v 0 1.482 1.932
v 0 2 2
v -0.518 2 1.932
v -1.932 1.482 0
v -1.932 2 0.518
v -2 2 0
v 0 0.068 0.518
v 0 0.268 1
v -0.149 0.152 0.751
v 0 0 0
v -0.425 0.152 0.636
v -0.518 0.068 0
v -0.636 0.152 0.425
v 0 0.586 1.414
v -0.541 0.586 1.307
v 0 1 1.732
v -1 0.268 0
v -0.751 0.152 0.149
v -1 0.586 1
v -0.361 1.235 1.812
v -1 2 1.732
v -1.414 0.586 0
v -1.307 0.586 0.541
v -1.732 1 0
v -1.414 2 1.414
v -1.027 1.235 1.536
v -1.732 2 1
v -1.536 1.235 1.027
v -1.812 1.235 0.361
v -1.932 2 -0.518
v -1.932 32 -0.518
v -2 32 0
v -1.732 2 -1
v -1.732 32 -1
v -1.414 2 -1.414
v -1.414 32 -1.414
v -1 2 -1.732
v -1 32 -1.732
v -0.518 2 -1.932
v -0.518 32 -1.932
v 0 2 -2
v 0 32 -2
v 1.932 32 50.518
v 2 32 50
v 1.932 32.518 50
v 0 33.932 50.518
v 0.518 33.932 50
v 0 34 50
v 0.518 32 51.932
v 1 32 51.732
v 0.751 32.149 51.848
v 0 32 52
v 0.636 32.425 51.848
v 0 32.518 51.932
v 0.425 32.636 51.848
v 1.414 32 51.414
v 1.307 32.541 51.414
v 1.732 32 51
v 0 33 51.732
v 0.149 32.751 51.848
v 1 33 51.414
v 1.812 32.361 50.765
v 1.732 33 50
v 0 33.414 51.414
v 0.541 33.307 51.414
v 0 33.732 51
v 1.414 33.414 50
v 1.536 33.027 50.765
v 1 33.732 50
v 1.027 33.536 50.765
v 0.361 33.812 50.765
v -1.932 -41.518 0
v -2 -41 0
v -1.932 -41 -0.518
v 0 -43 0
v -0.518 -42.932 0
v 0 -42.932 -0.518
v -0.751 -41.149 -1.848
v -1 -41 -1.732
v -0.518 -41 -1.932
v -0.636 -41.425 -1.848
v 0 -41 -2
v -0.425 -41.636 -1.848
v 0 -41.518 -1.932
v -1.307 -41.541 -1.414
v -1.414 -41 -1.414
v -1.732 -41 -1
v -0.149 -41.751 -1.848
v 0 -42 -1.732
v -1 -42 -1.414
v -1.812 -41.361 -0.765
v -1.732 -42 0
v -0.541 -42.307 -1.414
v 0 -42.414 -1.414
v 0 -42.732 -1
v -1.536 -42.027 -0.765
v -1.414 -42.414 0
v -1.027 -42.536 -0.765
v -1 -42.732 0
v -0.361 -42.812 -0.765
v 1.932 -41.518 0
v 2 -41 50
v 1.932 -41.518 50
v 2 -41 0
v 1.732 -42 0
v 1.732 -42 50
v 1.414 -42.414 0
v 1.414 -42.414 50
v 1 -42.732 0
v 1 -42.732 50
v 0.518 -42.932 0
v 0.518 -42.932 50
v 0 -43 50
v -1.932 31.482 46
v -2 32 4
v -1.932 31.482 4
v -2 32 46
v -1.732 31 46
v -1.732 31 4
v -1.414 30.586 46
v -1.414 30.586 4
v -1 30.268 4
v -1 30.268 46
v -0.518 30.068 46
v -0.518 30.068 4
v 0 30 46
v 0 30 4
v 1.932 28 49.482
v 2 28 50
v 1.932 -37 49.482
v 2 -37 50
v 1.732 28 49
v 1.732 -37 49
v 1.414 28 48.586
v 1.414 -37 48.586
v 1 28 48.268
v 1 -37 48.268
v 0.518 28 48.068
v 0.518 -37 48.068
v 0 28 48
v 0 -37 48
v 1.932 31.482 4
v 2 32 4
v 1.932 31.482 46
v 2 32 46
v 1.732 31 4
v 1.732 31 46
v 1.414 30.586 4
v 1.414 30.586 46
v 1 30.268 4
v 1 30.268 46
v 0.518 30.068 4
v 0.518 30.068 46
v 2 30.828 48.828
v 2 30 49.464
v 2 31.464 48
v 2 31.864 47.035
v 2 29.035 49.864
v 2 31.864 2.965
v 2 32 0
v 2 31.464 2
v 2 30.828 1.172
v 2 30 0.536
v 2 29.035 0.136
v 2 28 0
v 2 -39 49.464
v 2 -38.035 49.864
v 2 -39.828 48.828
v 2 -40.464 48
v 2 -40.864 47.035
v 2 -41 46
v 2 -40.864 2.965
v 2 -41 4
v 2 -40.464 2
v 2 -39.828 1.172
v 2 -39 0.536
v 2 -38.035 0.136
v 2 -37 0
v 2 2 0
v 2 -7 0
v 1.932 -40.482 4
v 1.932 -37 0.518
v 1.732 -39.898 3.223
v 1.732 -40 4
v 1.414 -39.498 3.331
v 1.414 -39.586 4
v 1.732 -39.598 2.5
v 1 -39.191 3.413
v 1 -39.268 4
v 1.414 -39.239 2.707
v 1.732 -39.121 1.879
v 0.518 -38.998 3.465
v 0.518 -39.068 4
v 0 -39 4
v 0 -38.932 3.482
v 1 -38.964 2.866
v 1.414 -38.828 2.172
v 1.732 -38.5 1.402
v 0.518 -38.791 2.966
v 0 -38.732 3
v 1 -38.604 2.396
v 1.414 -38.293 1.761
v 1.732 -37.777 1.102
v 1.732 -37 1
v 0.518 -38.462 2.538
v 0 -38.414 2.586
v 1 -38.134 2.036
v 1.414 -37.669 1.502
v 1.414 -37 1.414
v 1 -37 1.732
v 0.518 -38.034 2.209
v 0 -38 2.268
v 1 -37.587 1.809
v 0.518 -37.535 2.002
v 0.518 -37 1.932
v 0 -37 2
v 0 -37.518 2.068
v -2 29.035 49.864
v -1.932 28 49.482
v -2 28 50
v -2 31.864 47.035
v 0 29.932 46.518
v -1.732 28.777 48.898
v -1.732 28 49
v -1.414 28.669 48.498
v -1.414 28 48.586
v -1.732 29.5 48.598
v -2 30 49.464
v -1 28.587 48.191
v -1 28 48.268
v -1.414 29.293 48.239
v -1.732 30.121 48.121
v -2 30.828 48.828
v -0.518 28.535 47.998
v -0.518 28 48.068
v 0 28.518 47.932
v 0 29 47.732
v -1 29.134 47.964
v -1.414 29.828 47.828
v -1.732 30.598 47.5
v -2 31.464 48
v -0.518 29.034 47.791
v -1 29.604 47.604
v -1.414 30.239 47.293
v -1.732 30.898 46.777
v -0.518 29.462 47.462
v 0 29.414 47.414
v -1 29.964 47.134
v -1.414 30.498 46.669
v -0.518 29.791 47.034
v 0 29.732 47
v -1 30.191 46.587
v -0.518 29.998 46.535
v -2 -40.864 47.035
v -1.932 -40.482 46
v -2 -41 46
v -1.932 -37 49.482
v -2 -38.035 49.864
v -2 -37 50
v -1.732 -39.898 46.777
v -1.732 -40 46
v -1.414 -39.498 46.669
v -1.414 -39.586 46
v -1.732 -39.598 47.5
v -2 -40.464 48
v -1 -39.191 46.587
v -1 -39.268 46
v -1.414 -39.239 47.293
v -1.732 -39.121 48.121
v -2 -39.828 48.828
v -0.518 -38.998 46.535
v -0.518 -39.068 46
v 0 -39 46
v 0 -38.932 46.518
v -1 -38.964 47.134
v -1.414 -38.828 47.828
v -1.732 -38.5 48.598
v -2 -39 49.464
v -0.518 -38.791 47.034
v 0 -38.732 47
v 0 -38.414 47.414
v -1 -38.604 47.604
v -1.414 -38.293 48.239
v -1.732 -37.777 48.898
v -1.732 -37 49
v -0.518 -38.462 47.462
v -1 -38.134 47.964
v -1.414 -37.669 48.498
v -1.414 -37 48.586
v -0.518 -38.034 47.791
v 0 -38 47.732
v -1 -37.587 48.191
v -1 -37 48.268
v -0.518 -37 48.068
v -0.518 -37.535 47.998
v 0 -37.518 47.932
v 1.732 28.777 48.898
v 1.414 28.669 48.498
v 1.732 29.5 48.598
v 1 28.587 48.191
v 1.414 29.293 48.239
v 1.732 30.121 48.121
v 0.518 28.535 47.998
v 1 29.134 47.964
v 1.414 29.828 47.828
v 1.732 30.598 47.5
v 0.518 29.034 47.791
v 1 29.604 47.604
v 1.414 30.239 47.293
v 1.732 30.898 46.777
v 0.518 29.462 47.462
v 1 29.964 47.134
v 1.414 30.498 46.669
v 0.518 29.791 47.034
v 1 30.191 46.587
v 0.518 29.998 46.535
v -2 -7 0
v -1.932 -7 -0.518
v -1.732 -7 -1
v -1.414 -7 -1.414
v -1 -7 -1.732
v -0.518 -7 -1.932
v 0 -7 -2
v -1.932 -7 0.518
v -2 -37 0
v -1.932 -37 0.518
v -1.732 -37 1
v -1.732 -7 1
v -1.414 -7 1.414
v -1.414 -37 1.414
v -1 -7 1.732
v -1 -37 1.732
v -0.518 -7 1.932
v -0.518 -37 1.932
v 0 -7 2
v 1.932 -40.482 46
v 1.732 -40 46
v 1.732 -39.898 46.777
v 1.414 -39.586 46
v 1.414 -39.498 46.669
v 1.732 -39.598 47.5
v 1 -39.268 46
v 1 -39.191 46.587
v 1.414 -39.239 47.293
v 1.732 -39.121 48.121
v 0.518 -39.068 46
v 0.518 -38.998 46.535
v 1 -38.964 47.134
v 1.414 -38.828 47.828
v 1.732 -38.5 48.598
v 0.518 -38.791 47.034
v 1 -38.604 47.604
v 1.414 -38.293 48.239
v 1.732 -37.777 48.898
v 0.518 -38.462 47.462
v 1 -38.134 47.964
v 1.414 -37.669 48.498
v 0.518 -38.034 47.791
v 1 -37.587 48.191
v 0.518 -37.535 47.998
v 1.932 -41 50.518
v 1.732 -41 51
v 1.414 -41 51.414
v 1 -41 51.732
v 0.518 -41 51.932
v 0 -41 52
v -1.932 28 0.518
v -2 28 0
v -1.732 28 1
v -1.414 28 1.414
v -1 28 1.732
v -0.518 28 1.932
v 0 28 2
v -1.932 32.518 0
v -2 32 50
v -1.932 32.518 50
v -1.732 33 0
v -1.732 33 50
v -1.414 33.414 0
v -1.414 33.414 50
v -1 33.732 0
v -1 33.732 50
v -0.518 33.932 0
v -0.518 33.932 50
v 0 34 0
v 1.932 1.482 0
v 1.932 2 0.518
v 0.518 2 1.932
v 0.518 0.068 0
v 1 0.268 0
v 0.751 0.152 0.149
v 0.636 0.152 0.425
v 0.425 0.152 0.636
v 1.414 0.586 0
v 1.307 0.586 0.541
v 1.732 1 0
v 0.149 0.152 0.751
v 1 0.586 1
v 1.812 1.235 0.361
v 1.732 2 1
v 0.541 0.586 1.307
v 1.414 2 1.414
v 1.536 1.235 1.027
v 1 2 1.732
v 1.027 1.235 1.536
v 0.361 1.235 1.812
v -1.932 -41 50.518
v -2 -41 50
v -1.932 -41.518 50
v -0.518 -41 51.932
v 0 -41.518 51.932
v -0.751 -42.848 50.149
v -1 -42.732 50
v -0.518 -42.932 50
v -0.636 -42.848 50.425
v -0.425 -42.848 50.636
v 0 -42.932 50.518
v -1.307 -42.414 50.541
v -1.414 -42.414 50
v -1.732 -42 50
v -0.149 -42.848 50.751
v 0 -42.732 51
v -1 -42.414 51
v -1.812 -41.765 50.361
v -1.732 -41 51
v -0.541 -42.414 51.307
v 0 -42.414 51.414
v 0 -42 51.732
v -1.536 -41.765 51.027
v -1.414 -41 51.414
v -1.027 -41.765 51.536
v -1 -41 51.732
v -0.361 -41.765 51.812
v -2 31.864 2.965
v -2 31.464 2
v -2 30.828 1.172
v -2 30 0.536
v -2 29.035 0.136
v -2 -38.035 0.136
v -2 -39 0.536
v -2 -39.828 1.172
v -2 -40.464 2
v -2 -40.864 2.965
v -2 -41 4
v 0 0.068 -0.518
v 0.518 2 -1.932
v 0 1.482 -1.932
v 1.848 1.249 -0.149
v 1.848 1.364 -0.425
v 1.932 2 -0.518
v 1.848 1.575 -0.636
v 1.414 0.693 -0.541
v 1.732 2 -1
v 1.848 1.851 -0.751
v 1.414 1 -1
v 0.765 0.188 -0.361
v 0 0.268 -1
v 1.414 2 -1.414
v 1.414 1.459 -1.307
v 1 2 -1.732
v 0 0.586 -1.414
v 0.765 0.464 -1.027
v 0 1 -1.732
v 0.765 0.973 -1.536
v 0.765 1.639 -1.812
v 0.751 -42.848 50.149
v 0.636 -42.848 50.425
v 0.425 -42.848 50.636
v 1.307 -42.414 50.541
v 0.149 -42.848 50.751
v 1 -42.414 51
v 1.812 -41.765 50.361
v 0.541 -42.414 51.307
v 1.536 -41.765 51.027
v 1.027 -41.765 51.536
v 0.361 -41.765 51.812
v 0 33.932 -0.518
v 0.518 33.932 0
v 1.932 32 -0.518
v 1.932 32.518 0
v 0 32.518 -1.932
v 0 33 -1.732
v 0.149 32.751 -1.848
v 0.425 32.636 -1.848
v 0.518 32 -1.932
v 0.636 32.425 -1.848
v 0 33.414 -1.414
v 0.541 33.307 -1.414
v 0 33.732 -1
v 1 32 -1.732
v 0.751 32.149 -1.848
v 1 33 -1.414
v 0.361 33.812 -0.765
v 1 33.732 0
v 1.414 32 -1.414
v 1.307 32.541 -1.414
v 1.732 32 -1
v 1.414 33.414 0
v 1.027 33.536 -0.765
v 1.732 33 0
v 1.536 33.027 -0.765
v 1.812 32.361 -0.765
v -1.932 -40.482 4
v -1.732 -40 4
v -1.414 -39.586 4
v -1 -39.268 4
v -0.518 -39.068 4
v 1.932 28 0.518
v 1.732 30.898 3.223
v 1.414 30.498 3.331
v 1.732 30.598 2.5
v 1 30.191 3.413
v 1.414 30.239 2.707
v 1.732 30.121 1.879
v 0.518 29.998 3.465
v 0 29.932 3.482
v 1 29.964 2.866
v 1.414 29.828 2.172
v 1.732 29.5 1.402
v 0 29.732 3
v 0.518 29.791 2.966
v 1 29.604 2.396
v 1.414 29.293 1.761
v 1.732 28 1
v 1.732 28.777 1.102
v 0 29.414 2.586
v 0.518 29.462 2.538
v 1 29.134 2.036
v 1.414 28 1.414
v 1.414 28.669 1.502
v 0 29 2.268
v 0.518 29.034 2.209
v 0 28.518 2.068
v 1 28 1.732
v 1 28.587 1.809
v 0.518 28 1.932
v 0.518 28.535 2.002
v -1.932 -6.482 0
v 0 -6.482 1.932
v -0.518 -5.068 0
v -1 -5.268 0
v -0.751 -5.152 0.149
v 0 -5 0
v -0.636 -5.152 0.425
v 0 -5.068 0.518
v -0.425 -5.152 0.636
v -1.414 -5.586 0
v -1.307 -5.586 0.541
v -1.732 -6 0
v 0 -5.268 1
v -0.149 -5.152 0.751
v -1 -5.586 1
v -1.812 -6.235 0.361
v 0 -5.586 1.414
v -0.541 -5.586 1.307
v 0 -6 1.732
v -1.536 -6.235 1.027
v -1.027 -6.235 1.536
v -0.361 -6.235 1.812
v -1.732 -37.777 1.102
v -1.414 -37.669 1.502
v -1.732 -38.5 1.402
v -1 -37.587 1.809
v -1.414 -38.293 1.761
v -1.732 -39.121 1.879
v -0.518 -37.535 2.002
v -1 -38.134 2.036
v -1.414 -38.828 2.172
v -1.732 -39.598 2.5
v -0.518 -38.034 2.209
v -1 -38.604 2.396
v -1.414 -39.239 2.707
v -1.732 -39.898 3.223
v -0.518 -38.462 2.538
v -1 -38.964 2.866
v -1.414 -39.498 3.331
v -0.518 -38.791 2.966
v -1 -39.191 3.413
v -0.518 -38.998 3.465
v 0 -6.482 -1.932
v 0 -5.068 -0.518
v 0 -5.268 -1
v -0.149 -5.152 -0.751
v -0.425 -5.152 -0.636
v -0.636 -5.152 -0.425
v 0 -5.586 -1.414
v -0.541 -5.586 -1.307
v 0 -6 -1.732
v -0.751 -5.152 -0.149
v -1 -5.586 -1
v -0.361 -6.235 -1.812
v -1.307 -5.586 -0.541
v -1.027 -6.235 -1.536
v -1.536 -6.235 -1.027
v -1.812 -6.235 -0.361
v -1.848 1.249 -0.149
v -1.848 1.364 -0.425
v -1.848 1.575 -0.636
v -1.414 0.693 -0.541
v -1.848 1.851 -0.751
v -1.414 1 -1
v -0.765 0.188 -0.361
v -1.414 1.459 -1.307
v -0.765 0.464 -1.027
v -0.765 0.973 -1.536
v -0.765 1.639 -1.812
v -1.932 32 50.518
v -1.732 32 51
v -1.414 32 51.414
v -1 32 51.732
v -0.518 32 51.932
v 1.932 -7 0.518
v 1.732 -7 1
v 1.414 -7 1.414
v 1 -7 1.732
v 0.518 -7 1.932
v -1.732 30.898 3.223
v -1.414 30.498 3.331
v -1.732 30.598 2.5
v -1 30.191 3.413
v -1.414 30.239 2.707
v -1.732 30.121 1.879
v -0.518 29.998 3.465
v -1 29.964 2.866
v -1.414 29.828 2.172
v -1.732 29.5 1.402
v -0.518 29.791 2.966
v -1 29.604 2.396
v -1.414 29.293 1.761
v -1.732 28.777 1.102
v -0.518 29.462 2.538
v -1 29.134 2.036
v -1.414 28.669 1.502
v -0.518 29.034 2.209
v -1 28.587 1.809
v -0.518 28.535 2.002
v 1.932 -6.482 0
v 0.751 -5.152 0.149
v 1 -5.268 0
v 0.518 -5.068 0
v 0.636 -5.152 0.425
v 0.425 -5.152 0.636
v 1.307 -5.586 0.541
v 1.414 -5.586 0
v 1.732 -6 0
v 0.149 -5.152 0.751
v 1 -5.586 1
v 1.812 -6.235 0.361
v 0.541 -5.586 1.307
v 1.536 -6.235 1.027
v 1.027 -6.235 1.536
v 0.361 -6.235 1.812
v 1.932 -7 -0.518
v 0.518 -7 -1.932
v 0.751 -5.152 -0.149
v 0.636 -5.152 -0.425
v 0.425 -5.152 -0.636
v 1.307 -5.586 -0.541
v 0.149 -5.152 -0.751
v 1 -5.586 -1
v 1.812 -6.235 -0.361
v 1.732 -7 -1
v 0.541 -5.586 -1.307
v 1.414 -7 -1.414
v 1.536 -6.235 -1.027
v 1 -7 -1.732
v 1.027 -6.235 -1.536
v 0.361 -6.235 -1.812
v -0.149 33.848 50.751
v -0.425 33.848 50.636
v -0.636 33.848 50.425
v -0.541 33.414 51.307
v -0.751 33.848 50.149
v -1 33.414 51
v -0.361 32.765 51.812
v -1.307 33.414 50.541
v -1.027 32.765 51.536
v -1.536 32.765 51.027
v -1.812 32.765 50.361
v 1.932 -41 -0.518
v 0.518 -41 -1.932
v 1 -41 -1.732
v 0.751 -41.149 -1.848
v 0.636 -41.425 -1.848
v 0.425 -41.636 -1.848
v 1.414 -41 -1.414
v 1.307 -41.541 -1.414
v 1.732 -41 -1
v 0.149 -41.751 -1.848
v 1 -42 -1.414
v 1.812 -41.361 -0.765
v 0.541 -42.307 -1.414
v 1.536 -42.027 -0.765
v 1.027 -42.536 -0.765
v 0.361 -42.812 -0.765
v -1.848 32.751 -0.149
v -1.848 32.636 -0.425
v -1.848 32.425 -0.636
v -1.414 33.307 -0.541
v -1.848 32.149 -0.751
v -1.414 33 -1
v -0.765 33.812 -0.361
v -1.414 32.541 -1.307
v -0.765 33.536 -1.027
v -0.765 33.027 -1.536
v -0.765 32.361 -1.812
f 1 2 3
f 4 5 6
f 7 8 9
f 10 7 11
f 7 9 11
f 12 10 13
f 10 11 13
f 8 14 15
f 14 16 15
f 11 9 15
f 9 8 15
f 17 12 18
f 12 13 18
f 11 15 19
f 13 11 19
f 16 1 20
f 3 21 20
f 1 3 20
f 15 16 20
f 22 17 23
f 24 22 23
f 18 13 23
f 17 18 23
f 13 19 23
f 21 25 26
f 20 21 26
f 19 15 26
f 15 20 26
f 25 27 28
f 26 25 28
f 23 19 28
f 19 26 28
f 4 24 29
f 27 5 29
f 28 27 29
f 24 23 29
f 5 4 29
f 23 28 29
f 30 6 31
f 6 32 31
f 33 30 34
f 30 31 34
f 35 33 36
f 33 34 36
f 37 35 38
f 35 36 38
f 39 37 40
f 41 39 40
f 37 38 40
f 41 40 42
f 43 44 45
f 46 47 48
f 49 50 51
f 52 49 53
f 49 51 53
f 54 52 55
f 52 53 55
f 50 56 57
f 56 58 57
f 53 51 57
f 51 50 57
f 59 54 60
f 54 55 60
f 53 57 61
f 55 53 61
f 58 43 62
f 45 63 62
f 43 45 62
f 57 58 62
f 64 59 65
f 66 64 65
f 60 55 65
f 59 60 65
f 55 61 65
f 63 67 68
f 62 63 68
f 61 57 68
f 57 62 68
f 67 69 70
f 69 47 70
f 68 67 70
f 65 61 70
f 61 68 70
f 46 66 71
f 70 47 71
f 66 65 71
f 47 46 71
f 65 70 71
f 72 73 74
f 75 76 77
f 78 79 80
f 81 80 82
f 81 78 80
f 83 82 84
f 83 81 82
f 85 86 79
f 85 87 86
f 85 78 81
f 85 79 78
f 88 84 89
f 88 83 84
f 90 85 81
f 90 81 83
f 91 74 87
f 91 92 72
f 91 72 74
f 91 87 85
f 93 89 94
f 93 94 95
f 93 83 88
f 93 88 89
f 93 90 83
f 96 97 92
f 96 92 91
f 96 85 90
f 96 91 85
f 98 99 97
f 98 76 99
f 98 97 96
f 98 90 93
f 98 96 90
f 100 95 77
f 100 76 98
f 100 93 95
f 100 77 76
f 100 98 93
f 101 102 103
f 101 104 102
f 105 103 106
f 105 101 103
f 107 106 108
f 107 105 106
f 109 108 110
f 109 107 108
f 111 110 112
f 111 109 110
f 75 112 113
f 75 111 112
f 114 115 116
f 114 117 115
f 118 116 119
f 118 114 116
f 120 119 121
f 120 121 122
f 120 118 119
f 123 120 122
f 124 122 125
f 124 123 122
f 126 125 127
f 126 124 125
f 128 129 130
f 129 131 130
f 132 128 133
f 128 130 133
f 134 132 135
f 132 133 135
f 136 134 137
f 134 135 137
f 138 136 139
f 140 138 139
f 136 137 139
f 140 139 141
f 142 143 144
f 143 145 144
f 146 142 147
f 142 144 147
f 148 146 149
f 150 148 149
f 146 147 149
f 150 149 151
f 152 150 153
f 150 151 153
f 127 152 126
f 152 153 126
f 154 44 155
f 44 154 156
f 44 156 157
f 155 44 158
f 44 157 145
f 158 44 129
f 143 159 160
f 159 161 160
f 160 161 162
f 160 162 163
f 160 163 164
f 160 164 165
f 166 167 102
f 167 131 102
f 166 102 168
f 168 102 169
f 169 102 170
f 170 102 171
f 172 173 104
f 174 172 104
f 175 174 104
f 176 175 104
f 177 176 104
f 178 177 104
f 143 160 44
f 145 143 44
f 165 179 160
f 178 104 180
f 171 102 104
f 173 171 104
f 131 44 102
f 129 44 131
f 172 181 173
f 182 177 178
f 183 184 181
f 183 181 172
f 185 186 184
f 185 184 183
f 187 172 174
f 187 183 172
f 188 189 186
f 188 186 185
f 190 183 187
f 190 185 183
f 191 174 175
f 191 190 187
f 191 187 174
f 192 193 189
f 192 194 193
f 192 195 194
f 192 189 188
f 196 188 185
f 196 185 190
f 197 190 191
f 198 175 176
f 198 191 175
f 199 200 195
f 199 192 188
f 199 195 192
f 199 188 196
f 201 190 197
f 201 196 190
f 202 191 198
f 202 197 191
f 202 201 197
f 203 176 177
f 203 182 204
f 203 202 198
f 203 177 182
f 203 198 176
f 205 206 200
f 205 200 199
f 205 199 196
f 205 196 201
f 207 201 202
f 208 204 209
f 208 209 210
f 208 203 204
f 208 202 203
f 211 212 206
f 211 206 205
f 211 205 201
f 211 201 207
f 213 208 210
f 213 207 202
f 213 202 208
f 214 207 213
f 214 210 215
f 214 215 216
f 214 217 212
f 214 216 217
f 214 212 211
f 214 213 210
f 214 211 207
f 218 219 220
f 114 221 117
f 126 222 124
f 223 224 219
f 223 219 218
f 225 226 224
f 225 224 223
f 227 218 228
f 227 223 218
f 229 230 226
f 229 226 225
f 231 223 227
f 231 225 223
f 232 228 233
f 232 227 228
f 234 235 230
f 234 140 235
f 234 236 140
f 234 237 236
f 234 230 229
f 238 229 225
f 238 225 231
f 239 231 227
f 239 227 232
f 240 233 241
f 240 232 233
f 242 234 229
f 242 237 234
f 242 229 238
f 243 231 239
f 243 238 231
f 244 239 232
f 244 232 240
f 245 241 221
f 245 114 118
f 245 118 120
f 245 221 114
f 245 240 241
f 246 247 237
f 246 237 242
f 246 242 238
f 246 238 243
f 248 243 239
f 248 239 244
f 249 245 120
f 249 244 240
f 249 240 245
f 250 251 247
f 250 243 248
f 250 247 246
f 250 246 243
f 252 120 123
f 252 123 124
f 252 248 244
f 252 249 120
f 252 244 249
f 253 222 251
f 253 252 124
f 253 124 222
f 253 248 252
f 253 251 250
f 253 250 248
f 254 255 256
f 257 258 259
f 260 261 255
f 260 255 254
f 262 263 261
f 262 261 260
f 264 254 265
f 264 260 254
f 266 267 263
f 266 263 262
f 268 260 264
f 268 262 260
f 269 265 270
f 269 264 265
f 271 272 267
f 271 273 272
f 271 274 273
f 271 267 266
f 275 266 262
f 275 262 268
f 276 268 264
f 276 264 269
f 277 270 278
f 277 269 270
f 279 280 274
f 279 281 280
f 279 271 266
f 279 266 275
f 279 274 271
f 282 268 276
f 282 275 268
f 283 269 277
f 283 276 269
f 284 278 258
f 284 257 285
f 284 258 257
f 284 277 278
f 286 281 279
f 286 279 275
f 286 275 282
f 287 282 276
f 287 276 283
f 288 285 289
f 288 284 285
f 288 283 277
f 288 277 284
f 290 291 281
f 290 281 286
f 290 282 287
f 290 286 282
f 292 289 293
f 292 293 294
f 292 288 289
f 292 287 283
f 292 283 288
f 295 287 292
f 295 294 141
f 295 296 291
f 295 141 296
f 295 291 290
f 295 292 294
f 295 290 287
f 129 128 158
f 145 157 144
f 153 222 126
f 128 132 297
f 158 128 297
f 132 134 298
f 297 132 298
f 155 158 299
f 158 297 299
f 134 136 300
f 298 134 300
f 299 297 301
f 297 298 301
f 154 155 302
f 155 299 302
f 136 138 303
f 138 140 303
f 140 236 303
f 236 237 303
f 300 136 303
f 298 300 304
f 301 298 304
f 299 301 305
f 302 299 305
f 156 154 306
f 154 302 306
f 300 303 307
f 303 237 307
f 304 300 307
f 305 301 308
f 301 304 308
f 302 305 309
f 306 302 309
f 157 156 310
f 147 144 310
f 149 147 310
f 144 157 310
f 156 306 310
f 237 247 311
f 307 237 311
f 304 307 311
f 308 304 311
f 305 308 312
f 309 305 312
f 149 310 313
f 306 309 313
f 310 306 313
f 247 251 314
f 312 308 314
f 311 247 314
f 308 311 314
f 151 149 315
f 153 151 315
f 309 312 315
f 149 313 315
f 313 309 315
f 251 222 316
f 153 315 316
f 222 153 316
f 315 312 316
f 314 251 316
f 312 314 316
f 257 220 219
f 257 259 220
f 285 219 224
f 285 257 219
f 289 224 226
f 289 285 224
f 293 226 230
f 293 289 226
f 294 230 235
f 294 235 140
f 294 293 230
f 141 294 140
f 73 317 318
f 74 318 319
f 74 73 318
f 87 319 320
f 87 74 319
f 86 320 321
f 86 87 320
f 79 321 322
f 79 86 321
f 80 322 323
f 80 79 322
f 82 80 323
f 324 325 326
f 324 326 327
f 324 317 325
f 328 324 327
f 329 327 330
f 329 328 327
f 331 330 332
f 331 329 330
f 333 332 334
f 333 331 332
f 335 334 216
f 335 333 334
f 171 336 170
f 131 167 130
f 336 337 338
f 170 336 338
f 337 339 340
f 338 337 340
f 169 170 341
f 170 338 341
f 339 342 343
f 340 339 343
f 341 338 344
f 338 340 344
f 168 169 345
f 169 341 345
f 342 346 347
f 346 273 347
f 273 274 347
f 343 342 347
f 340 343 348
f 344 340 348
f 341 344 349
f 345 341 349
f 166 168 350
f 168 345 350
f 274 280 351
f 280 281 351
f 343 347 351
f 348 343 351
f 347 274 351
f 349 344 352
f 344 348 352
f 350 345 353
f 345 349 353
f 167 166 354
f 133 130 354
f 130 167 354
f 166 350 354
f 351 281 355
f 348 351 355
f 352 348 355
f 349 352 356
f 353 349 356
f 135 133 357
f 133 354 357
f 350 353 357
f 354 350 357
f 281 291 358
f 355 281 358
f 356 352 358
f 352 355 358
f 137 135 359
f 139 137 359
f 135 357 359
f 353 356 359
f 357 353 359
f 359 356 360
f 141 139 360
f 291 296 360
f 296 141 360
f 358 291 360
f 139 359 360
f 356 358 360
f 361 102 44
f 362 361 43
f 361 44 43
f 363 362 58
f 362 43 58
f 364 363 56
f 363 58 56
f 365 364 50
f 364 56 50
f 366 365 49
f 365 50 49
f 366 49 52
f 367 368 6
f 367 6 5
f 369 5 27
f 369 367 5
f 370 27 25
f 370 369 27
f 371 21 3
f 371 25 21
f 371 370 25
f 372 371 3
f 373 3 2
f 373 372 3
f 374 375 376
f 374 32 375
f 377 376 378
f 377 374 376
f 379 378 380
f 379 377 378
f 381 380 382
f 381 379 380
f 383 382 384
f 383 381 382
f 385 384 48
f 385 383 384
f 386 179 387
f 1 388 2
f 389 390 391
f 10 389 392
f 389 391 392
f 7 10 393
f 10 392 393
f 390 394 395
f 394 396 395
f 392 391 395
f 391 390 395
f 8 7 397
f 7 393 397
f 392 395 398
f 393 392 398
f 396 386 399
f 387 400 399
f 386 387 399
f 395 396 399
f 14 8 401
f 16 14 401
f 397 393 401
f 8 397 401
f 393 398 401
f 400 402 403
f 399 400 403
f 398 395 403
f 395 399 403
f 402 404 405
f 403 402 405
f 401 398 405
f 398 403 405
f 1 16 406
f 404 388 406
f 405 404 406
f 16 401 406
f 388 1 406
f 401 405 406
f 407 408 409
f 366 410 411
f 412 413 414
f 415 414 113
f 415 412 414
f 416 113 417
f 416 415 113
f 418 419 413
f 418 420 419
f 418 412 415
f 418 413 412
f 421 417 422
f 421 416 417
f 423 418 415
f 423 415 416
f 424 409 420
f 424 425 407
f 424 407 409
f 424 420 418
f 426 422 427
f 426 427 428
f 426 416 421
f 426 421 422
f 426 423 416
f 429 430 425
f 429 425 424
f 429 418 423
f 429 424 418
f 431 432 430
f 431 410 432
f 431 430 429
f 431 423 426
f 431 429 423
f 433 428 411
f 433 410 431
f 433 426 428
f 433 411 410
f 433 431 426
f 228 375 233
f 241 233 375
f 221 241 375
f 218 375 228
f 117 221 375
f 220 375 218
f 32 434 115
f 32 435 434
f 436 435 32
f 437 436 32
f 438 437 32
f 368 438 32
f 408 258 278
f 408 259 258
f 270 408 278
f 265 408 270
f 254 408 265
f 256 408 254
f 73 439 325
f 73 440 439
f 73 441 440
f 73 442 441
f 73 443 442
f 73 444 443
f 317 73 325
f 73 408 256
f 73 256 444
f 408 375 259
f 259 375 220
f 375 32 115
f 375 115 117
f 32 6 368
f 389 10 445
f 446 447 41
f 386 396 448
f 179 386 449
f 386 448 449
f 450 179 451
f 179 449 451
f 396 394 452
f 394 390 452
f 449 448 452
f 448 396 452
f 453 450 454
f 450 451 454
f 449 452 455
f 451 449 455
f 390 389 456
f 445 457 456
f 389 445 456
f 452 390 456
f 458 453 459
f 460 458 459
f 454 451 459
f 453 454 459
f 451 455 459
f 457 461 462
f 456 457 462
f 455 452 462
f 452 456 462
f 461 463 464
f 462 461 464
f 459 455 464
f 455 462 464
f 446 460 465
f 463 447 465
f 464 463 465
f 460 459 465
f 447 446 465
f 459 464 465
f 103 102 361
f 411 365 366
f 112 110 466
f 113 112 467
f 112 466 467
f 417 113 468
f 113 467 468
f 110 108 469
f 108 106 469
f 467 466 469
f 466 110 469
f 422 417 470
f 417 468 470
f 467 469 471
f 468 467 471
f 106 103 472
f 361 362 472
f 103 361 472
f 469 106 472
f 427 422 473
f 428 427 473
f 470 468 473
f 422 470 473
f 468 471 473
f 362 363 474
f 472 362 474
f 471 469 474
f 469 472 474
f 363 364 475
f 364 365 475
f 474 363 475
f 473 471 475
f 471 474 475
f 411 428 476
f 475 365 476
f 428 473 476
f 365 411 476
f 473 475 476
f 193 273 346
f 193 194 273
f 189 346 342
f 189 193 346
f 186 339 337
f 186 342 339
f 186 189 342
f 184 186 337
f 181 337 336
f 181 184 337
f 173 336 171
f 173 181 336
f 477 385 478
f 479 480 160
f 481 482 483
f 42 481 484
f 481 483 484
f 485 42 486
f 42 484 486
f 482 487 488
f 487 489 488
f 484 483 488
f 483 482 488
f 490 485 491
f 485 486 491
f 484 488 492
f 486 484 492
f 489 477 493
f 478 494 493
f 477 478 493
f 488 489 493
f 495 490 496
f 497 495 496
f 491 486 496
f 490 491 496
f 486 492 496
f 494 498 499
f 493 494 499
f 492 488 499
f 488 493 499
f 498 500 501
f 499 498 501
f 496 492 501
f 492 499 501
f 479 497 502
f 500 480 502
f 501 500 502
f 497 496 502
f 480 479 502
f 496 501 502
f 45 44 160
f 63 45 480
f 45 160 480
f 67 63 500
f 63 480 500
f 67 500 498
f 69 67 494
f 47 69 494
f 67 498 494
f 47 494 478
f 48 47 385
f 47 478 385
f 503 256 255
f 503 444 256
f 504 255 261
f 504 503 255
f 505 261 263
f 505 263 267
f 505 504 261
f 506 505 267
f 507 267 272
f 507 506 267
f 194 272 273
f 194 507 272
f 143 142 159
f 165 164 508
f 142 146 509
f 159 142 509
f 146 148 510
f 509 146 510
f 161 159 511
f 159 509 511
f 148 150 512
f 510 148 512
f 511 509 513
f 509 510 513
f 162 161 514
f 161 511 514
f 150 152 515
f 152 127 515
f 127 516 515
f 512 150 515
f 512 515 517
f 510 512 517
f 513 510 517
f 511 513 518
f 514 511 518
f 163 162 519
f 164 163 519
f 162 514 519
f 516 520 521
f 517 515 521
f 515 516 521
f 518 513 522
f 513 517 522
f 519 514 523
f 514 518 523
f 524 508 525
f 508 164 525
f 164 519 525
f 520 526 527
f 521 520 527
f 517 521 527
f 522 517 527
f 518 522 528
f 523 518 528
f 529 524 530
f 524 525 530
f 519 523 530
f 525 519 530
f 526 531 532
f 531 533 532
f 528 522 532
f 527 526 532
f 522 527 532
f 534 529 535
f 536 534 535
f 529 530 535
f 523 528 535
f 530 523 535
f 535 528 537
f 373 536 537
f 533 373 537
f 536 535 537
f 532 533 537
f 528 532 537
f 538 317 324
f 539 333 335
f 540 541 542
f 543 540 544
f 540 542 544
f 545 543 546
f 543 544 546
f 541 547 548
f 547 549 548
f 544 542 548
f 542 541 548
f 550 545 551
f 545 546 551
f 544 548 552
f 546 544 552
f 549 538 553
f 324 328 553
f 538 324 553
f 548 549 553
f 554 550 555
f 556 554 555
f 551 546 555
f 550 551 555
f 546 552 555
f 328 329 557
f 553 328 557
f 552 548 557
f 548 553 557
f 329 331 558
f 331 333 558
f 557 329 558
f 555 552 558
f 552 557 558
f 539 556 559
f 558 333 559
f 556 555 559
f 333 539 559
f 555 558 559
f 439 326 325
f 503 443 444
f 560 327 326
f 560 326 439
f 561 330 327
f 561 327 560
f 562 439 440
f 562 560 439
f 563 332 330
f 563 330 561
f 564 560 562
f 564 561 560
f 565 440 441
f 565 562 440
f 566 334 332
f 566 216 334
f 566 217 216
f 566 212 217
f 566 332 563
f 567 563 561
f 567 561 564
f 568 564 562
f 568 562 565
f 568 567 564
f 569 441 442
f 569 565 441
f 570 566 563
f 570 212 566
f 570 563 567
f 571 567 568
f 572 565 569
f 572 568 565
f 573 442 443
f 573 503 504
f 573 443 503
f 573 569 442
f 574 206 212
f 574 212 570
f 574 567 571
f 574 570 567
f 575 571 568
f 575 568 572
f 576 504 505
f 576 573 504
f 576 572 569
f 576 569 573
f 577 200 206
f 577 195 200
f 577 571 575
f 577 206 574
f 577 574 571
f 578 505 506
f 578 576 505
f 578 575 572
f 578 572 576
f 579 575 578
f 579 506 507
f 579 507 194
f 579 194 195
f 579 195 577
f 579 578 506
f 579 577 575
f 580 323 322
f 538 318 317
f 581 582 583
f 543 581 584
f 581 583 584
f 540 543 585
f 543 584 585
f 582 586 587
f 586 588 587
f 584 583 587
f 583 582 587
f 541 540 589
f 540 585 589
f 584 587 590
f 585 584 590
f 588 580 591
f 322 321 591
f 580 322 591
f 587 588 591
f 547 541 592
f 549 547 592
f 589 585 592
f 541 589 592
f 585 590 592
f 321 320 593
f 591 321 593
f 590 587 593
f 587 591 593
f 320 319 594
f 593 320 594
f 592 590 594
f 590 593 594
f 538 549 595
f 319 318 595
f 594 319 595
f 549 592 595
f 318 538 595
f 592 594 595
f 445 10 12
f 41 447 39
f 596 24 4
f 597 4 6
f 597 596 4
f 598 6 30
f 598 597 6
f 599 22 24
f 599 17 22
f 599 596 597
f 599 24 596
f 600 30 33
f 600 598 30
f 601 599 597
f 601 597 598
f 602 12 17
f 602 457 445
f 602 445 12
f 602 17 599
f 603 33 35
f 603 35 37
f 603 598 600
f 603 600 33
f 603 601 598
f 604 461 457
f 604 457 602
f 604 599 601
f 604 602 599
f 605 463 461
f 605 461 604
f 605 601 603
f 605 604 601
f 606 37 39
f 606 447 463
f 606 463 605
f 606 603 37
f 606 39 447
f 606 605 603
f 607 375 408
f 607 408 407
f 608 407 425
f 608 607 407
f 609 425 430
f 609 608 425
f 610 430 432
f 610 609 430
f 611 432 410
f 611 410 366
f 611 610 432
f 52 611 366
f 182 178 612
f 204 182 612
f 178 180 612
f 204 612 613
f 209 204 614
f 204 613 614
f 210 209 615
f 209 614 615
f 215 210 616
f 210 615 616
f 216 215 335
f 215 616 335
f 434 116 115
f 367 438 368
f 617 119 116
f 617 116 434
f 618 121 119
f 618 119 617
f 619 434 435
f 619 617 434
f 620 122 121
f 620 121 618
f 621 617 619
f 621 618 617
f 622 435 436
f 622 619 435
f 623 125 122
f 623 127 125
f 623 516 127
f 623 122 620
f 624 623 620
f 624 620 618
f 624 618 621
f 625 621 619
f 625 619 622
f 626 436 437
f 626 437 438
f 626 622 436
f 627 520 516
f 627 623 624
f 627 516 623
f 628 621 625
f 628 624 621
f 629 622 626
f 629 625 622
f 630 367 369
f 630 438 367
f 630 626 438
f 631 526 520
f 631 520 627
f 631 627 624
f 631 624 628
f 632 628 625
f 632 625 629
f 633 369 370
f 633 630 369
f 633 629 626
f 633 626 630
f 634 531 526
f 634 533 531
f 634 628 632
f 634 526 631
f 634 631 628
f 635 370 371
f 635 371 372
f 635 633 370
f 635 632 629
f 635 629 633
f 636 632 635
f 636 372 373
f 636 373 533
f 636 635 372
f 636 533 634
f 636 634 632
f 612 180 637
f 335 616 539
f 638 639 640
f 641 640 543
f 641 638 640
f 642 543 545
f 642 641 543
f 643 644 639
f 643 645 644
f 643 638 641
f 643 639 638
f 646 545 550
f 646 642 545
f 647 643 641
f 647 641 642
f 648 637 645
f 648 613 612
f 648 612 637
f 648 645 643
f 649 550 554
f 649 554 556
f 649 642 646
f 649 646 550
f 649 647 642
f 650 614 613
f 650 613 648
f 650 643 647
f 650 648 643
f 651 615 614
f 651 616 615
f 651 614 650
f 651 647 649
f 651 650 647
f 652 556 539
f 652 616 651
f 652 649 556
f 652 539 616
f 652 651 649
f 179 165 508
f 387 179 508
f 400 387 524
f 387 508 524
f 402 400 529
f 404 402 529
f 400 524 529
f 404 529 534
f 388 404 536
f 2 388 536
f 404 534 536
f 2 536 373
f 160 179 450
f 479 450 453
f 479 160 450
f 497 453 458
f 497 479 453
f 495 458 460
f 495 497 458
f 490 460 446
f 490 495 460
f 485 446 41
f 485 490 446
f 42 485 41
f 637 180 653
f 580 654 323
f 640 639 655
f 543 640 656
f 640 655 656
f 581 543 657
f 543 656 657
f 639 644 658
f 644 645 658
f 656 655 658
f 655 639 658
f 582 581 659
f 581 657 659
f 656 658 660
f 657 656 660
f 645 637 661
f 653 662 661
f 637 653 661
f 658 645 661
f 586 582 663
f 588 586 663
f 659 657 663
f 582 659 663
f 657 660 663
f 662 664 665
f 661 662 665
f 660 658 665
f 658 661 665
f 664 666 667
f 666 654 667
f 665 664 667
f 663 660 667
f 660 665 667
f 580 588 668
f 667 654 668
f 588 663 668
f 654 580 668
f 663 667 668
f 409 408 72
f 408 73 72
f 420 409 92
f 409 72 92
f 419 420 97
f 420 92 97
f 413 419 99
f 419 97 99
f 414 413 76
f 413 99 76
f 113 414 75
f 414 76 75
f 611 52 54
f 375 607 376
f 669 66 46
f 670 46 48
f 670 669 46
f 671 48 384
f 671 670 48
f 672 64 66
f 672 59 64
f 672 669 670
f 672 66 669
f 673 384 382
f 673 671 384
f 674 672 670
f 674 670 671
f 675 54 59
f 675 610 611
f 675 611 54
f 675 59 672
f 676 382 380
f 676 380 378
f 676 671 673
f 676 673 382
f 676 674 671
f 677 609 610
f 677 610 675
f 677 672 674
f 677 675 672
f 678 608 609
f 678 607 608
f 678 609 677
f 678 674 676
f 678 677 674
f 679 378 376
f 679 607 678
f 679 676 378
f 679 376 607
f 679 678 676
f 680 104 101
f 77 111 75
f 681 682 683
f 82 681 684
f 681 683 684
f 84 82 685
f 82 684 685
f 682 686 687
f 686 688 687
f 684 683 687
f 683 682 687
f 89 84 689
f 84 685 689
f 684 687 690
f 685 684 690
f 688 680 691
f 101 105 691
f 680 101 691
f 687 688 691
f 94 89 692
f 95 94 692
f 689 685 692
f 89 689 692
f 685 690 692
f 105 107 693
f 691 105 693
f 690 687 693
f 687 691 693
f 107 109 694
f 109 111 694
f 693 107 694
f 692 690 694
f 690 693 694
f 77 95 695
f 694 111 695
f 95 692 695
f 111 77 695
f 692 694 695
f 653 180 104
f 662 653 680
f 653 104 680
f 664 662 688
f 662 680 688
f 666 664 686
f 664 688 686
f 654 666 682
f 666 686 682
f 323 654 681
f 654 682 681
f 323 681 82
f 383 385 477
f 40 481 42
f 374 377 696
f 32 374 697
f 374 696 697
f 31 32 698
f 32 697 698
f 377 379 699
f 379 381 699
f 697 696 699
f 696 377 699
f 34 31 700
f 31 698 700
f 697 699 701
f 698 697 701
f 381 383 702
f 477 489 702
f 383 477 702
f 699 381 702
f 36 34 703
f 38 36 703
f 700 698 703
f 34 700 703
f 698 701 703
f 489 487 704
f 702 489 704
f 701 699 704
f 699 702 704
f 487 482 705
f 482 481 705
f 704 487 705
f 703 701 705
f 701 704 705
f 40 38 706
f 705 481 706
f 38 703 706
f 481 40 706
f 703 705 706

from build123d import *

# Parameters (mm, degrees)
SZKIC1_W                    = 4
SZKIC1_H                    = 4
DODANIE_WYCI_GNI_CIE1_DEPTH = 34
SZKIC2_W                    = 4
SZKIC2_H                    = 4
DODANIE_WYCI_GNI_CIE2_DEPTH = 50
SZKIC3_W                    = 4
SZKIC3_H                    = 4
DODANIE_WYCI_GNI_CIE3_DEPTH = 73
SZKIC4_W                    = 4
SZKIC4_H                    = 4
DODANIE_WYCI_GNI_CIE4_DEPTH = 50
SZKIC5_W                    = 4
SZKIC5_H                    = 4
DODANIE_WYCI_GNI_CIE5_DEPTH = 34
ZAOKR_GLENIE1_R             = 2


with BuildPart() as part:
    # Szkic1 → Dodanie-wyciągnięcie1 (new body)
    with BuildSketch(Plane(origin=(0, 0, 0), x_dir=(1, 0, 0), z_dir=(0, 1, 0))):
        Rectangle(SZKIC1_W, SZKIC1_H)
    extrude(amount=DODANIE_WYCI_GNI_CIE1_DEPTH)

    # Szkic2 → Dodanie-wyciągnięcie2 (add)
    with BuildSketch(Plane.XY.offset(2)):
        with Locations((0, 32)):
            Rectangle(SZKIC2_W, SZKIC2_H)
    extrude(amount=DODANIE_WYCI_GNI_CIE2_DEPTH)

    # Szkic3 → Dodanie-wyciągnięcie3 (add)
    with BuildSketch(Plane.XZ.offset(-30)):
        with Locations((0, 50)):
            Rectangle(SZKIC3_W, SZKIC3_H)
    extrude(amount=DODANIE_WYCI_GNI_CIE3_DEPTH)

    # Szkic4 → Dodanie-wyciągnięcie4 (add)
    with BuildSketch(Plane(origin=(0, 0, 48), x_dir=(-1, 0, 0), z_dir=(0, 0, -1))):
        with Locations((0, -41)):
            Rectangle(SZKIC4_W, SZKIC4_H)
    extrude(amount=DODANIE_WYCI_GNI_CIE4_DEPTH)

    # Szkic5 → Dodanie-wyciągnięcie5 (add)
    with BuildSketch(Plane(origin=(0, -39, 0), x_dir=(1, 0, 0), z_dir=(0, 1, 0))):
        Rectangle(SZKIC5_W, SZKIC5_H)
    extrude(amount=DODANIE_WYCI_GNI_CIE5_DEPTH)

    # Zaokrąglenie1
    zaokr_glenie1_edges = [part.edges().sort_by_distance(p)[0] for p in [
        (2, 34, 25),
        (0, 34, -2),
        (2, 15, 2),
        (-2, 15, 2),
        (0, 30, 2),
        (-2, -4.5, 52),
        (2, -4.5, 52),
        (0, 34, 52),
        (2, 30, 25),
        (-2, 30, 25),
        (0, 30, 48),
        (-2, -43, 25),
        (2, -43, 25),
        (0, -43, 52),
        (2, -4.5, 48),
        (-2, -4.5, 48),
        (-2, 34, 25),
        (0, -39, 48),
        (-2, -24, -2),
        (2, -24, -2),
        (0, -43, -2),
        (0, 0, -2),
        (2, 0, 0),
        (2, -39, 25),
        (-2, -39, 25),
        (0, 0, 2),
        (2, -22, 2),
        (0, -39, 2),
        (-2, -22, 2),
        (2, -5, 0),
        (0, -5, -2),
        (-2, -5, 0),
        (0, -5, 2),
        (-2, 0, 0),
        (-2, 17, -2),
        (2, 17, -2),
    ]]
    fillet(zaokr_glenie1_edges, radius=ZAOKR_GLENIE1_R - 0.0001)  # a hair under: the kernel refuses the full size


solid = part.part
